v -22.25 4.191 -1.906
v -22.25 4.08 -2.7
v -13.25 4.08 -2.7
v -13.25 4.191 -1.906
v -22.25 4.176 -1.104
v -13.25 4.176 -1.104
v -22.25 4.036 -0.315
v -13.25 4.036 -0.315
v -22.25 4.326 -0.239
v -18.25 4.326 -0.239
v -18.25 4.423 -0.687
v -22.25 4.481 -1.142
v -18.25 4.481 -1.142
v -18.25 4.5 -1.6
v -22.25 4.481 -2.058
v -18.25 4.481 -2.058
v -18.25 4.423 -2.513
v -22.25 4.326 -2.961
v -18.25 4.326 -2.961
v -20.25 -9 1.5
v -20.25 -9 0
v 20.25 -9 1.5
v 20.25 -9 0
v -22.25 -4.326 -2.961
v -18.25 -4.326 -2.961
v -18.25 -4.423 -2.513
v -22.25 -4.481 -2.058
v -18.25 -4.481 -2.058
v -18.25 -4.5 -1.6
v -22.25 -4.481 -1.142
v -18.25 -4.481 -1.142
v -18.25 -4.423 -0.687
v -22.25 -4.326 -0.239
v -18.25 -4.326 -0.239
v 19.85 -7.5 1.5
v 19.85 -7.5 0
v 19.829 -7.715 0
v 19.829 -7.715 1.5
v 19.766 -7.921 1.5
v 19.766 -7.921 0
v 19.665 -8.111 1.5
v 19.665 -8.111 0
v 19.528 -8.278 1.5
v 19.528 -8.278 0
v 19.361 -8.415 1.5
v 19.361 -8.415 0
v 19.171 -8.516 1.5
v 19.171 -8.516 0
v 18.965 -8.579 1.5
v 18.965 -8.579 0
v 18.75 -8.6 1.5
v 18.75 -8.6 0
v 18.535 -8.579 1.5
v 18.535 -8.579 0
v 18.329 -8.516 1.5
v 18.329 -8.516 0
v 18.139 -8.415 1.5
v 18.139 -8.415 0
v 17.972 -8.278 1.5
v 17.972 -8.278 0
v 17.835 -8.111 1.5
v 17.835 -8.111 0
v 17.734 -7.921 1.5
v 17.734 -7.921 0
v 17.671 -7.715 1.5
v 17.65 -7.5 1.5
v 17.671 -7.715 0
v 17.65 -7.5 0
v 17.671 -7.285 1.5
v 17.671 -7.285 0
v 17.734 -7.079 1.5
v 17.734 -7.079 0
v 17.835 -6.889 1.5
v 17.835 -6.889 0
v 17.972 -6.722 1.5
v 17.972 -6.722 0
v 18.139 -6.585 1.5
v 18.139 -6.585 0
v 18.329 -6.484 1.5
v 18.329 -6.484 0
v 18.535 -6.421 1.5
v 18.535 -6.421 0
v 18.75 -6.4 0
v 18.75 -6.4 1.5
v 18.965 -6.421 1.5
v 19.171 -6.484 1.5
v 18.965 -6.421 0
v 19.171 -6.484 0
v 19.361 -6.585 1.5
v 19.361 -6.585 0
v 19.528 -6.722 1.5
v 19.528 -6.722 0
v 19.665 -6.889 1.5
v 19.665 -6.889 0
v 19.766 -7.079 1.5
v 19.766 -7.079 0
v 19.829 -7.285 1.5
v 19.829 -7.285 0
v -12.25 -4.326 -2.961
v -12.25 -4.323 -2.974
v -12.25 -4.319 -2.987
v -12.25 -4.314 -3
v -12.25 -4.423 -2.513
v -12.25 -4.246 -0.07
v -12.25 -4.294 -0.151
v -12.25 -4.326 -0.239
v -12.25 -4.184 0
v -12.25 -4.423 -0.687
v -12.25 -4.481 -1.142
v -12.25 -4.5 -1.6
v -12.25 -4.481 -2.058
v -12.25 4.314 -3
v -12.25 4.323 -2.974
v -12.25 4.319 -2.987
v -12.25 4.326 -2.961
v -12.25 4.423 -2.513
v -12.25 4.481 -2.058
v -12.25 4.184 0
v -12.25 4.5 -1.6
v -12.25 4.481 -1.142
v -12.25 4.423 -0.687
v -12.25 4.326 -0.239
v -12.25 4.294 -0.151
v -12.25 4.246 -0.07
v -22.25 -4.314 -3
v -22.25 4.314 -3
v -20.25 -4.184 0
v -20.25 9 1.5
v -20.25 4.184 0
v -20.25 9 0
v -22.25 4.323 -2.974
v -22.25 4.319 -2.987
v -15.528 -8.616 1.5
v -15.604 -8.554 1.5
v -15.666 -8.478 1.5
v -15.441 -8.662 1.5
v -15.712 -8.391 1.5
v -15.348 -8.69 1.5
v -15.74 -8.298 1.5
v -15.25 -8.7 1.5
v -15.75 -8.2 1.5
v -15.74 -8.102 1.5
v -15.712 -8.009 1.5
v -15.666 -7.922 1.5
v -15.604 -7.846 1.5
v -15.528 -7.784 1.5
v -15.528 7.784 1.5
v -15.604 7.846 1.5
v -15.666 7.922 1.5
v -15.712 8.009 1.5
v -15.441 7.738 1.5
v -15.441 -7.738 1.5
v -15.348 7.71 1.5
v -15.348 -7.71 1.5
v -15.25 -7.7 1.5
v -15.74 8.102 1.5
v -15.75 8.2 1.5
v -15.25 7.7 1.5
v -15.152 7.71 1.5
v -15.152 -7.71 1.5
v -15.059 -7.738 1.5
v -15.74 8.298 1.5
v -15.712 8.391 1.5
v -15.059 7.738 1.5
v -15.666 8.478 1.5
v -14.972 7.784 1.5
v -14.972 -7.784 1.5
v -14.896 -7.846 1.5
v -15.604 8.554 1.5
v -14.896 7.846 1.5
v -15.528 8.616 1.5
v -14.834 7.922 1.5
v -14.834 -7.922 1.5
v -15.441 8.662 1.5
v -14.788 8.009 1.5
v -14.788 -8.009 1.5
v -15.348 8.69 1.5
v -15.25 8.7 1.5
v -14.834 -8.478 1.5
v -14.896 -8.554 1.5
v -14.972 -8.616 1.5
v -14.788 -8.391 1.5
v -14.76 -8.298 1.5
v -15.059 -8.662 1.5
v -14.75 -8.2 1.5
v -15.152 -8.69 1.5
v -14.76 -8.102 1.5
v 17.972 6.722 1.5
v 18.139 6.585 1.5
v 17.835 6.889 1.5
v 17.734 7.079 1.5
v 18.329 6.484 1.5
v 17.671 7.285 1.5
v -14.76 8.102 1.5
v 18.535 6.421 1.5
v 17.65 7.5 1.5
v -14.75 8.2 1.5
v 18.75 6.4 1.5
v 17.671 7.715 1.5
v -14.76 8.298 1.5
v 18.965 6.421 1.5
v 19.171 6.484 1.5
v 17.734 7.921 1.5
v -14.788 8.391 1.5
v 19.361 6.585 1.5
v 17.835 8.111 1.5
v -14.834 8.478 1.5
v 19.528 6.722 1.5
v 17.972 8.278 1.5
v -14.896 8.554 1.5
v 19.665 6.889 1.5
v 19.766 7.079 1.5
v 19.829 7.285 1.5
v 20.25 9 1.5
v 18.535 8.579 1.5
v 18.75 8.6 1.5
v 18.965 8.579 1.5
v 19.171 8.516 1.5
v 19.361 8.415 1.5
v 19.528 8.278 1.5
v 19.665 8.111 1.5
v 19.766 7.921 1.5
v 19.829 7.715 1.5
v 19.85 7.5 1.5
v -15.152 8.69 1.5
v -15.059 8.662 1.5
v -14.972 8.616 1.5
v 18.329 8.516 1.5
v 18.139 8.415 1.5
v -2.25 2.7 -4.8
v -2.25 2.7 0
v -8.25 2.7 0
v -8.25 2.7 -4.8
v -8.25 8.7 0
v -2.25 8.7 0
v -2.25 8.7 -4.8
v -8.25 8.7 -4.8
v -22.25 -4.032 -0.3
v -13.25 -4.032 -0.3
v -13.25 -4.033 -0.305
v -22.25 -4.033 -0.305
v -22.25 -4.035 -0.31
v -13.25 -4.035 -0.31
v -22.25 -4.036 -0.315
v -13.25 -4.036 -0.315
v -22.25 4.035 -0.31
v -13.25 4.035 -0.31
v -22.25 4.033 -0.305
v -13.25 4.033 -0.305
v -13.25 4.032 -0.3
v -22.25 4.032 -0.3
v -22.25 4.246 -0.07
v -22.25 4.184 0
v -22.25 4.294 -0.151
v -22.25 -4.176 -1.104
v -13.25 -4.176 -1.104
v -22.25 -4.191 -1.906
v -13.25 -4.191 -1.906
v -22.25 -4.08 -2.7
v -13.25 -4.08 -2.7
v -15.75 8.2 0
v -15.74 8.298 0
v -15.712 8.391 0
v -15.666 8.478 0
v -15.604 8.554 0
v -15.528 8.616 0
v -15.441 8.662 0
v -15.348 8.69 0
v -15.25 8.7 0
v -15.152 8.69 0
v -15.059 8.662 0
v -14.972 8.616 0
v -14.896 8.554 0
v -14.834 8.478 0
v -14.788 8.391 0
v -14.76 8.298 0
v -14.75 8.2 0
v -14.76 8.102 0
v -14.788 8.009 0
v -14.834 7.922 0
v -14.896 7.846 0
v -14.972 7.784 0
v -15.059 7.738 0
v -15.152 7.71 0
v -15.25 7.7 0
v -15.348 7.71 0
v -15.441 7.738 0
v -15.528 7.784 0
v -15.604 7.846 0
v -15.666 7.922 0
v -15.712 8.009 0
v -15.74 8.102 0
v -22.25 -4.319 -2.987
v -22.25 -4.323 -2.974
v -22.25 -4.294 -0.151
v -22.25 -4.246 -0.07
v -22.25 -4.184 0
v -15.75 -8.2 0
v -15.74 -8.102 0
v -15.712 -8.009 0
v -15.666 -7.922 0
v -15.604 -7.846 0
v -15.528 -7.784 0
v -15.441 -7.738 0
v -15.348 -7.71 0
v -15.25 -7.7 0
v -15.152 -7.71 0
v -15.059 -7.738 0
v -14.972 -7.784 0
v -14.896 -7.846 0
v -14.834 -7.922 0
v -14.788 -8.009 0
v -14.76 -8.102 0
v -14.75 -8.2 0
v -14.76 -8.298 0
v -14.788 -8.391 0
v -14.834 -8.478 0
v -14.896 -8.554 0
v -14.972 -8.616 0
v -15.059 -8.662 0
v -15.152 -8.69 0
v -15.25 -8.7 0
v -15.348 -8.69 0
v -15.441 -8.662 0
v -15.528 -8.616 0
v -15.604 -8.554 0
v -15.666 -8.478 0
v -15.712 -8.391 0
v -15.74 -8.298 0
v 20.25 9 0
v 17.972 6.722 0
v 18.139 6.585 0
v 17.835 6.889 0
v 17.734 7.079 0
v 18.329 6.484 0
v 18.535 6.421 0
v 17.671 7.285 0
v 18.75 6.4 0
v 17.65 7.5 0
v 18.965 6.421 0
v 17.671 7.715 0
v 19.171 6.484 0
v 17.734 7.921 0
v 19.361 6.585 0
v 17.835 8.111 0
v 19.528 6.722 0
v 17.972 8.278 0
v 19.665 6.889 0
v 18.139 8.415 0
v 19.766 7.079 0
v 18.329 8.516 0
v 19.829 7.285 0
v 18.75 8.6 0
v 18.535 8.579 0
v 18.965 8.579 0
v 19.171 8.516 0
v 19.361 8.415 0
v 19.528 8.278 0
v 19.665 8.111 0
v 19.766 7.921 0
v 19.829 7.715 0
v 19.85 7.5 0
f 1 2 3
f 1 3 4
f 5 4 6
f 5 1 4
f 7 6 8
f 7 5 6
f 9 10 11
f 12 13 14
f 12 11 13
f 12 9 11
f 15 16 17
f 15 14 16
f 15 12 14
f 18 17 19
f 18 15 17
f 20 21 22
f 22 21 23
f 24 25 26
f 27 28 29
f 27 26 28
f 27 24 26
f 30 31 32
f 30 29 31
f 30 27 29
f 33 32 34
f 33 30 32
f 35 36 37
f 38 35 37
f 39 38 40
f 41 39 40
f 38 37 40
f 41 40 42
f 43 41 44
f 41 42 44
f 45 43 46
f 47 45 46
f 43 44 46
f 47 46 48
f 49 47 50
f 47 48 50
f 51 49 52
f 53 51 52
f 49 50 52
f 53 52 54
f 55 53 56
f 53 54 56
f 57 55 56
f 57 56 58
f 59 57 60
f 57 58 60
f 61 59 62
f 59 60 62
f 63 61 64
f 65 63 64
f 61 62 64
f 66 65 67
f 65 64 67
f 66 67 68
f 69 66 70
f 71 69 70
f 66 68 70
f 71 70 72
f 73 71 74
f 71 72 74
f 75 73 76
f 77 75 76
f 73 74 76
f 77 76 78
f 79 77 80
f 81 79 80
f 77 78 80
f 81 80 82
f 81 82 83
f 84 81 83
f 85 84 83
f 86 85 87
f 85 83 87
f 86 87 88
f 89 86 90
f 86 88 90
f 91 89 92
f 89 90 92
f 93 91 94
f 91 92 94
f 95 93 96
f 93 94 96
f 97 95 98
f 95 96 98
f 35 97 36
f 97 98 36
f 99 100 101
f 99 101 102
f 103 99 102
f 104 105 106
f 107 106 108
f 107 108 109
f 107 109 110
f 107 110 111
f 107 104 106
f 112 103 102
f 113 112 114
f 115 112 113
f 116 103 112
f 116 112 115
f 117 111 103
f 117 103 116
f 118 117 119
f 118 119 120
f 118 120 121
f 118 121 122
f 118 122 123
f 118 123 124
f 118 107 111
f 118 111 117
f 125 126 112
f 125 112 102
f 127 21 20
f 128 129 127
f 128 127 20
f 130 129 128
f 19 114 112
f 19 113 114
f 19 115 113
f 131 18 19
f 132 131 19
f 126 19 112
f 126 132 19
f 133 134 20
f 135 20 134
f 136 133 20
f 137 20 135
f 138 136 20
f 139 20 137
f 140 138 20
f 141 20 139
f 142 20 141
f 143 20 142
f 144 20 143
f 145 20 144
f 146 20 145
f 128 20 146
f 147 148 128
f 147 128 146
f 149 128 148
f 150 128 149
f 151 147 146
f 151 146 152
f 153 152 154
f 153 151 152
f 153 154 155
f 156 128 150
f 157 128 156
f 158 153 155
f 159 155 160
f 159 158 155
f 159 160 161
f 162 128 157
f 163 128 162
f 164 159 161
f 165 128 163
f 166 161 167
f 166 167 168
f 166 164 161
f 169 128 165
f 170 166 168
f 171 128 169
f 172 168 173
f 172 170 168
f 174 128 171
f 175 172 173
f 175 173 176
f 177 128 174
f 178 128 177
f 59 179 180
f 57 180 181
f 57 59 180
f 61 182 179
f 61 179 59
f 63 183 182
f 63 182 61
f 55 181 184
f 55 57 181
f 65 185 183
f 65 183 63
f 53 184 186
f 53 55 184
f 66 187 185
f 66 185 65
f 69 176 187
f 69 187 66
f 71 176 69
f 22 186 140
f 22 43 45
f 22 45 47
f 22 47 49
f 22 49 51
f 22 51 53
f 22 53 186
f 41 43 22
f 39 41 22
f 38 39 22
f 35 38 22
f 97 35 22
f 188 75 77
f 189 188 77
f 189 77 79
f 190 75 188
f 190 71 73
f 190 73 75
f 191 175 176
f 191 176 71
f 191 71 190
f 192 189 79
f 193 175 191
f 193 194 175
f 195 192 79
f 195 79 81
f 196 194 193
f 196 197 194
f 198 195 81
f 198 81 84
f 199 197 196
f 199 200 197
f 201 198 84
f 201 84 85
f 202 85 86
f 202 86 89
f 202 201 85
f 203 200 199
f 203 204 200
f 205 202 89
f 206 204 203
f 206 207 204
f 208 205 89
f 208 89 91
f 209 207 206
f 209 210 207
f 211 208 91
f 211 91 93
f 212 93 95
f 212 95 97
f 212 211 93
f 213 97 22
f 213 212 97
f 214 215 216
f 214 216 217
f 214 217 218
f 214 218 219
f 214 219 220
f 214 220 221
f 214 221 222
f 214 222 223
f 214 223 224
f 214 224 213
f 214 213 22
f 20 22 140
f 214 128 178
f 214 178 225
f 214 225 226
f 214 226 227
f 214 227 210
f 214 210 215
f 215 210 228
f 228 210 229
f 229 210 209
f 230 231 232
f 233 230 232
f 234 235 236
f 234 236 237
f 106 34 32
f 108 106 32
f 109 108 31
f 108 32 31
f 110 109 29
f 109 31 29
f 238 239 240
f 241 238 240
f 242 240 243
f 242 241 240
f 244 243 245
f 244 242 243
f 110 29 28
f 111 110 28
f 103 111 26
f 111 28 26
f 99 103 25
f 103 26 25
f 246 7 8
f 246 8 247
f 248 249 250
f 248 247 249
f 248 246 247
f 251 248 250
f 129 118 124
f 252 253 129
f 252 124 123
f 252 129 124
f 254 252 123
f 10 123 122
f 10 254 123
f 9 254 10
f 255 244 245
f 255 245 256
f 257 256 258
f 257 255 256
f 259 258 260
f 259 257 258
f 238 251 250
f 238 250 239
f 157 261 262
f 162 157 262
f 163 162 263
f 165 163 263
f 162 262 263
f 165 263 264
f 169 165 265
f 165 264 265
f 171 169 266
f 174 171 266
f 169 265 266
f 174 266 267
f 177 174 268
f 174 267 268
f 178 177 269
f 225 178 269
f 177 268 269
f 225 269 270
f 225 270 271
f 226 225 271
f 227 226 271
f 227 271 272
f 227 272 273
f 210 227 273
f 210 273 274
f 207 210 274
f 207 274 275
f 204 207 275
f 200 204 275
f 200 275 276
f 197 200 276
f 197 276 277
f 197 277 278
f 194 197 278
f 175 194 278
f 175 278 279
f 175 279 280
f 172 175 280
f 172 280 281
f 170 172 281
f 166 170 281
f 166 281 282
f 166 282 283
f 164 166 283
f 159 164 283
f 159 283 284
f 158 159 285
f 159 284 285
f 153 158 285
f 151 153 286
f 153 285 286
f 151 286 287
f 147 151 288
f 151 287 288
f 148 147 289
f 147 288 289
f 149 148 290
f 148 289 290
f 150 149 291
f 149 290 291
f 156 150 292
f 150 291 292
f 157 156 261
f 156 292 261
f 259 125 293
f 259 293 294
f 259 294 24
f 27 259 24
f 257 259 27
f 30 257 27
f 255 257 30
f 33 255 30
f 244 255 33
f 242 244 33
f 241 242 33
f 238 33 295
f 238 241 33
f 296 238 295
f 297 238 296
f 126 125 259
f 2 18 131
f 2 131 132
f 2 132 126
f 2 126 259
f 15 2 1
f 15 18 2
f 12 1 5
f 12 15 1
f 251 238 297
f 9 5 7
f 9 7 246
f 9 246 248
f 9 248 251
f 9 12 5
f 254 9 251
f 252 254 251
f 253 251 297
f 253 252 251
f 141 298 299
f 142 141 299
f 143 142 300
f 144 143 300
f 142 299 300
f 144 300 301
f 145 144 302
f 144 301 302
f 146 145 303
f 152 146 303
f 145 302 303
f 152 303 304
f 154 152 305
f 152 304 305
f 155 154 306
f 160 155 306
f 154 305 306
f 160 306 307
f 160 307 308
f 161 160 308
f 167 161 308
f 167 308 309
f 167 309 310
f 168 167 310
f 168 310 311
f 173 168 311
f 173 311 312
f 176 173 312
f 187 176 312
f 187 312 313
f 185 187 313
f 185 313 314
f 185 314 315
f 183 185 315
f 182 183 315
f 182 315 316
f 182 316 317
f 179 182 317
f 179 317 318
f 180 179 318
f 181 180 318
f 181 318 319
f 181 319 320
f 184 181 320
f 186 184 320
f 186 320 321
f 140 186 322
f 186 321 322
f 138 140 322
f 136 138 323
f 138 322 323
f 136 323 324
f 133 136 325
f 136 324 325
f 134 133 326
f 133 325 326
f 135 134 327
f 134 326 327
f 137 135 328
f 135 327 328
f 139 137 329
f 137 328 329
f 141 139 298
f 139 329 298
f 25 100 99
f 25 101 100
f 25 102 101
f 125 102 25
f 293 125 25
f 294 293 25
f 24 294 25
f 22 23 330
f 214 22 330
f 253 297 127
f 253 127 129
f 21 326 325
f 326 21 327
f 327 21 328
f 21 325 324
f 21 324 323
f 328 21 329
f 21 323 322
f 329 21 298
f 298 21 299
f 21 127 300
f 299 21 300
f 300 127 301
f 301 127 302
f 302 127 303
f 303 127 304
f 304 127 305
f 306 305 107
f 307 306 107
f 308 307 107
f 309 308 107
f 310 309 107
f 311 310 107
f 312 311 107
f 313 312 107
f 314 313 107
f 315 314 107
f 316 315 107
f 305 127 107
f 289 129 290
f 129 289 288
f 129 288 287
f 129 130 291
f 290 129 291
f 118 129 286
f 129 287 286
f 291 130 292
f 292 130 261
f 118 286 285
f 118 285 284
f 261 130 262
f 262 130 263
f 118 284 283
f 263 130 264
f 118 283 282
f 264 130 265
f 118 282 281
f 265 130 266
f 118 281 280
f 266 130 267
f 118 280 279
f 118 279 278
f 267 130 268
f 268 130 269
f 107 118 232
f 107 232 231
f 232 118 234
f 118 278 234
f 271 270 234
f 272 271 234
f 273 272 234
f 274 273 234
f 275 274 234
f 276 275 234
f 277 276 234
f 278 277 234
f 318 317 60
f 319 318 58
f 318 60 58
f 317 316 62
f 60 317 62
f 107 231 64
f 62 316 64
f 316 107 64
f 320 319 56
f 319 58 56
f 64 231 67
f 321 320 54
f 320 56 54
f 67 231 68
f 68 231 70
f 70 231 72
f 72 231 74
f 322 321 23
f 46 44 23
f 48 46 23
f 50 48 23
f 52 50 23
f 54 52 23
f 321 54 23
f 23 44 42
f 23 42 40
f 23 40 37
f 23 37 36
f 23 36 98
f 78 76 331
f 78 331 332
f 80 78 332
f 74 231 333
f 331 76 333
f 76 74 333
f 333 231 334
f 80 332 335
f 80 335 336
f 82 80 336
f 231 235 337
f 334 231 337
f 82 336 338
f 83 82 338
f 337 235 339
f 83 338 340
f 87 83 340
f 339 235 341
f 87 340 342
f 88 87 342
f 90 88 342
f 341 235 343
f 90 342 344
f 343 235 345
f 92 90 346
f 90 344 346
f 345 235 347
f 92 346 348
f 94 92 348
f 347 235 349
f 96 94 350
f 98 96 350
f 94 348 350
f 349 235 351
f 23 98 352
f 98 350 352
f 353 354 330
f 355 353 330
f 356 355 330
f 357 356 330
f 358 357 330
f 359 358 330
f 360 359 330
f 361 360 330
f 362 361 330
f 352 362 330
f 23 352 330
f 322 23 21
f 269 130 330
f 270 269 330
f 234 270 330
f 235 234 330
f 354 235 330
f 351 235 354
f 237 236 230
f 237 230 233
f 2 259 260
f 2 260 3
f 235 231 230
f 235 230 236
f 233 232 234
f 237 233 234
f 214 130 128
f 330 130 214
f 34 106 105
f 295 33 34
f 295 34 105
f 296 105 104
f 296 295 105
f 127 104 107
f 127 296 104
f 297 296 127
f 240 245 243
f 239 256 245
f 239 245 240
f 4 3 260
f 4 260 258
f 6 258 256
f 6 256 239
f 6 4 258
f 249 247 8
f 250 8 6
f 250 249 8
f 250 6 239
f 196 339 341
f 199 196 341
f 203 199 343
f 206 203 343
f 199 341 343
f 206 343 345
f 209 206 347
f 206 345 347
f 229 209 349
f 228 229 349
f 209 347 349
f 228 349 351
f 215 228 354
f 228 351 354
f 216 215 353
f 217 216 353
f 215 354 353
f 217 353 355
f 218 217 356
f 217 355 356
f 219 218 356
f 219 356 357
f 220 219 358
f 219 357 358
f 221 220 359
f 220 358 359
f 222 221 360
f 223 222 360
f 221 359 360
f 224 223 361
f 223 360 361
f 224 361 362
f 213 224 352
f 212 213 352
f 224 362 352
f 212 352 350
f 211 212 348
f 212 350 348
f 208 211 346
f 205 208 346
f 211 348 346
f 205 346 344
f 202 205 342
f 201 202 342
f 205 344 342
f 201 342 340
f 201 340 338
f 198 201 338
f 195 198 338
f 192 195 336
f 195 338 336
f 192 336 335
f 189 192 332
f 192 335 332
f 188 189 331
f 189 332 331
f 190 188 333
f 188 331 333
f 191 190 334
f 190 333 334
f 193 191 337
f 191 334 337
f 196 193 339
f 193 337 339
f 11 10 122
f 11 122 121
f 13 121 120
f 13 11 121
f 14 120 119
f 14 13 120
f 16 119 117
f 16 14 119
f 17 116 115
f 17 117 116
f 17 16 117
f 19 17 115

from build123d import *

# Parameters (mm, degrees)
IZIM1_W                     = 40.5
IZIM1_H                     = 18
Y_KSEKLIK_EKSTR_ZYON1_DEPTH = 1.5
IZIM2_R                     = 1.1
KES_EKSTR_ZYON1_DEPTH       = 1.5
IZIM3_W                     = 6
IZIM3_H                     = 6
Y_KSEKLIK_EKSTR_ZYON2_DEPTH = 4.8
IZIM4_W                     = 6
IZIM4_H                     = 9
Y_KSEKLIK_EKSTR_ZYON3_DEPTH = 3
KES_EKSTR_ZYON2_DEPTH       = 6
KES_EKSTR_ZYON3_DEPTH       = 5
IZIM8_R                     = 0.5
KES_EKSTR_ZYON4_DEPTH       = 5
Y_KSEKLIK_EKSTR_ZYON4_START = 4
Y_KSEKLIK_EKSTR_ZYON4_DEPTH = 4


with BuildPart() as part:
    # Çizim1 → Yükseklik-Ekstrüzyon1 (new body)
    with BuildSketch(Plane.XY):
        Rectangle(IZIM1_W, IZIM1_H)
    extrude(amount=Y_KSEKLIK_EKSTR_ZYON1_DEPTH)

    # Çizim2 → Kes-Ekstrüzyon1 (cut)
    with BuildSketch(Plane(origin=(0, 0, 0), x_dir=(-1, 0, 0), z_dir=(0, 0, -1))):
        with Locations((-18.75, 7.5)):
            Circle(IZIM2_R)
        with Locations((-18.75, -7.5)):
            Circle(IZIM2_R)
    extrude(amount=-KES_EKSTR_ZYON1_DEPTH, mode=Mode.SUBTRACT)

    # Çizim3 → Yükseklik-Ekstrüzyon2 (add)
    with BuildSketch(Plane(origin=(0, 0, 0), x_dir=(-1, 0, 0), z_dir=(0, 0, -1))):
        with Locations((5.25, 5.7)):
            Rectangle(IZIM3_W, IZIM3_H)
    extrude(amount=Y_KSEKLIK_EKSTR_ZYON2_DEPTH)

    # Çizim4 → Yükseklik-Ekstrüzyon3 (add)
    with BuildSketch(Plane(origin=(0, 0, 0), x_dir=(-1, 0, 0), z_dir=(0, 0, -1))):
        with Locations((15.25, 0)):
            Rectangle(IZIM4_W, IZIM4_H)
    extrude(amount=Y_KSEKLIK_EKSTR_ZYON3_DEPTH)

    # Çizim6 → Kes-Ekstrüzyon2 (cut)
    with BuildSketch(Plane.ZY.offset(18.25)):
        with BuildLine():
            ThreePointArc((-2.960618191, -4.326328271), (-2.980432326, -4.320748503), (-3, -4.314357896))
            Line((-3, -4.314357896), (-3, -4.5))
            Line((-3, -4.5), (-1.6, -4.5))
            ThreePointArc((-1.6, -4.5), (-2.285828647, -4.456406648), (-2.960618191, -4.326328271))
        make_face()
        with BuildLine():
            Line((-3, 4.5), (-3, 4.314357896))
            ThreePointArc((-3, 4.314357896), (-2.980432326, 4.320748503), (-2.960618191, 4.326328271))
            ThreePointArc((-2.960618191, 4.326328271), (-2.285828657, 4.456406647), (-1.60000002, 4.5))
            Line((-1.60000002, 4.5), (-3, 4.5))
        make_face()
        with BuildLine():
            ThreePointArc((-0.239381809, -4.326328271), (-0.914171353, -4.456406648), (-1.6, -4.5))
            Line((-1.6, -4.5), (0, -4.5))
            Line((0, -4.5), (0, -4.184107288))
            ThreePointArc((0, -4.184107288), (-0.109591088, -4.272217467), (-0.239381809, -4.326328271))
        make_face()
        with BuildLine():
            Line((0, 4.5), (-1.60000002, 4.5))
            ThreePointArc((-1.60000002, 4.5), (-0.914171363, 4.456406649), (-0.239381809, 4.326328271))
            ThreePointArc((-0.239381809, 4.326328271), (-0.109591088, 4.272217467), (0, 4.184107288))
            Line((0, 4.184107288), (0, 4.5))
        make_face()
    extrude(amount=-KES_EKSTR_ZYON2_DEPTH, mode=Mode.SUBTRACT)

    # Çizim7 → Kes-Ekstrüzyon3 (cut)
    with BuildSketch(Plane.ZY.offset(18.25)):
        with BuildLine():
            Line((-0.3, -4.031510098), (-0.3, 4.031510098))
            ThreePointArc((-0.3, 4.031510098), (-0.307326862, 4.033870403), (-0.314739124, 4.035947013))
            ThreePointArc((-0.314739124, 4.035947013), (-1.504744914, 4.199113259), (-2.7, 4.080360227))
            Line((-2.7, 4.080360227), (-2.7, -4.080360227))
            ThreePointArc((-2.7, -4.080360227), (-1.504744914, -4.199113259), (-0.314739124, -4.035947013))
            ThreePointArc((-0.314739124, -4.035947013), (-0.307326862, -4.033870403), (-0.3, -4.031510098))
        make_face()
    extrude(amount=-KES_EKSTR_ZYON3_DEPTH, mode=Mode.SUBTRACT)

    # Çizim8 → Kes-Ekstrüzyon4 (cut)
    with BuildSketch(Plane(origin=(0, 0, 0), x_dir=(-1, 0, 0), z_dir=(0, 0, -1))):
        with Locations((15.25, 8.2)):
            Circle(IZIM8_R)
        with Locations((15.25, -8.2)):
            Circle(IZIM8_R)
    extrude(amount=-KES_EKSTR_ZYON4_DEPTH, mode=Mode.SUBTRACT)

    # Çizim9 → Yükseklik-Ekstrüzyon4 (add)
    with BuildSketch(Plane.ZY.offset(18.25).offset(Y_KSEKLIK_EKSTR_ZYON4_START)):
        with BuildLine():
            ThreePointArc((-0.239381809, -4.326328271), (-0.109591088, -4.272217467), (0, -4.184107288))
            Line((0, -4.184107288), (0, 4.184107288))
            ThreePointArc((0, 4.184107288), (-0.109591088, 4.272217467), (-0.239381809, 4.326328271))
            ThreePointArc((-0.239381809, 4.326328271), (-1.6, 4.5), (-2.960618191, 4.326328271))
            ThreePointArc((-2.960618191, 4.326328271), (-2.980432326, 4.320748503), (-3, 4.314357896))
            Line((-3, 4.314357896), (-3, -4.314357896))
            ThreePointArc((-3, -4.314357896), (-2.980432326, -4.320748503), (-2.960618191, -4.326328271))
            ThreePointArc((-2.960618191, -4.326328271), (-1.6, -4.5), (-0.239381809, -4.326328271))
        make_face()
        with BuildLine():
            Line((-0.3, 4.031510098), (-0.3, -4.031510098))
            ThreePointArc((-0.3, -4.031510098), (-0.307326862, -4.033870403), (-0.314739124, -4.035947013))
            ThreePointArc((-0.314739124, -4.035947013), (-1.504744914, -4.199113259), (-2.7, -4.080360227))
            Line((-2.7, -4.080360227), (-2.7, 4.080360227))
            ThreePointArc((-2.7, 4.080360227), (-1.504744914, 4.199113259), (-0.314739124, 4.035947013))
            ThreePointArc((-0.314739124, 4.035947013), (-0.307326862, 4.033870403), (-0.3, 4.031510098))
        make_face(mode=Mode.SUBTRACT)
    extrude(amount=-Y_KSEKLIK_EKSTR_ZYON4_DEPTH)


solid = part.part
